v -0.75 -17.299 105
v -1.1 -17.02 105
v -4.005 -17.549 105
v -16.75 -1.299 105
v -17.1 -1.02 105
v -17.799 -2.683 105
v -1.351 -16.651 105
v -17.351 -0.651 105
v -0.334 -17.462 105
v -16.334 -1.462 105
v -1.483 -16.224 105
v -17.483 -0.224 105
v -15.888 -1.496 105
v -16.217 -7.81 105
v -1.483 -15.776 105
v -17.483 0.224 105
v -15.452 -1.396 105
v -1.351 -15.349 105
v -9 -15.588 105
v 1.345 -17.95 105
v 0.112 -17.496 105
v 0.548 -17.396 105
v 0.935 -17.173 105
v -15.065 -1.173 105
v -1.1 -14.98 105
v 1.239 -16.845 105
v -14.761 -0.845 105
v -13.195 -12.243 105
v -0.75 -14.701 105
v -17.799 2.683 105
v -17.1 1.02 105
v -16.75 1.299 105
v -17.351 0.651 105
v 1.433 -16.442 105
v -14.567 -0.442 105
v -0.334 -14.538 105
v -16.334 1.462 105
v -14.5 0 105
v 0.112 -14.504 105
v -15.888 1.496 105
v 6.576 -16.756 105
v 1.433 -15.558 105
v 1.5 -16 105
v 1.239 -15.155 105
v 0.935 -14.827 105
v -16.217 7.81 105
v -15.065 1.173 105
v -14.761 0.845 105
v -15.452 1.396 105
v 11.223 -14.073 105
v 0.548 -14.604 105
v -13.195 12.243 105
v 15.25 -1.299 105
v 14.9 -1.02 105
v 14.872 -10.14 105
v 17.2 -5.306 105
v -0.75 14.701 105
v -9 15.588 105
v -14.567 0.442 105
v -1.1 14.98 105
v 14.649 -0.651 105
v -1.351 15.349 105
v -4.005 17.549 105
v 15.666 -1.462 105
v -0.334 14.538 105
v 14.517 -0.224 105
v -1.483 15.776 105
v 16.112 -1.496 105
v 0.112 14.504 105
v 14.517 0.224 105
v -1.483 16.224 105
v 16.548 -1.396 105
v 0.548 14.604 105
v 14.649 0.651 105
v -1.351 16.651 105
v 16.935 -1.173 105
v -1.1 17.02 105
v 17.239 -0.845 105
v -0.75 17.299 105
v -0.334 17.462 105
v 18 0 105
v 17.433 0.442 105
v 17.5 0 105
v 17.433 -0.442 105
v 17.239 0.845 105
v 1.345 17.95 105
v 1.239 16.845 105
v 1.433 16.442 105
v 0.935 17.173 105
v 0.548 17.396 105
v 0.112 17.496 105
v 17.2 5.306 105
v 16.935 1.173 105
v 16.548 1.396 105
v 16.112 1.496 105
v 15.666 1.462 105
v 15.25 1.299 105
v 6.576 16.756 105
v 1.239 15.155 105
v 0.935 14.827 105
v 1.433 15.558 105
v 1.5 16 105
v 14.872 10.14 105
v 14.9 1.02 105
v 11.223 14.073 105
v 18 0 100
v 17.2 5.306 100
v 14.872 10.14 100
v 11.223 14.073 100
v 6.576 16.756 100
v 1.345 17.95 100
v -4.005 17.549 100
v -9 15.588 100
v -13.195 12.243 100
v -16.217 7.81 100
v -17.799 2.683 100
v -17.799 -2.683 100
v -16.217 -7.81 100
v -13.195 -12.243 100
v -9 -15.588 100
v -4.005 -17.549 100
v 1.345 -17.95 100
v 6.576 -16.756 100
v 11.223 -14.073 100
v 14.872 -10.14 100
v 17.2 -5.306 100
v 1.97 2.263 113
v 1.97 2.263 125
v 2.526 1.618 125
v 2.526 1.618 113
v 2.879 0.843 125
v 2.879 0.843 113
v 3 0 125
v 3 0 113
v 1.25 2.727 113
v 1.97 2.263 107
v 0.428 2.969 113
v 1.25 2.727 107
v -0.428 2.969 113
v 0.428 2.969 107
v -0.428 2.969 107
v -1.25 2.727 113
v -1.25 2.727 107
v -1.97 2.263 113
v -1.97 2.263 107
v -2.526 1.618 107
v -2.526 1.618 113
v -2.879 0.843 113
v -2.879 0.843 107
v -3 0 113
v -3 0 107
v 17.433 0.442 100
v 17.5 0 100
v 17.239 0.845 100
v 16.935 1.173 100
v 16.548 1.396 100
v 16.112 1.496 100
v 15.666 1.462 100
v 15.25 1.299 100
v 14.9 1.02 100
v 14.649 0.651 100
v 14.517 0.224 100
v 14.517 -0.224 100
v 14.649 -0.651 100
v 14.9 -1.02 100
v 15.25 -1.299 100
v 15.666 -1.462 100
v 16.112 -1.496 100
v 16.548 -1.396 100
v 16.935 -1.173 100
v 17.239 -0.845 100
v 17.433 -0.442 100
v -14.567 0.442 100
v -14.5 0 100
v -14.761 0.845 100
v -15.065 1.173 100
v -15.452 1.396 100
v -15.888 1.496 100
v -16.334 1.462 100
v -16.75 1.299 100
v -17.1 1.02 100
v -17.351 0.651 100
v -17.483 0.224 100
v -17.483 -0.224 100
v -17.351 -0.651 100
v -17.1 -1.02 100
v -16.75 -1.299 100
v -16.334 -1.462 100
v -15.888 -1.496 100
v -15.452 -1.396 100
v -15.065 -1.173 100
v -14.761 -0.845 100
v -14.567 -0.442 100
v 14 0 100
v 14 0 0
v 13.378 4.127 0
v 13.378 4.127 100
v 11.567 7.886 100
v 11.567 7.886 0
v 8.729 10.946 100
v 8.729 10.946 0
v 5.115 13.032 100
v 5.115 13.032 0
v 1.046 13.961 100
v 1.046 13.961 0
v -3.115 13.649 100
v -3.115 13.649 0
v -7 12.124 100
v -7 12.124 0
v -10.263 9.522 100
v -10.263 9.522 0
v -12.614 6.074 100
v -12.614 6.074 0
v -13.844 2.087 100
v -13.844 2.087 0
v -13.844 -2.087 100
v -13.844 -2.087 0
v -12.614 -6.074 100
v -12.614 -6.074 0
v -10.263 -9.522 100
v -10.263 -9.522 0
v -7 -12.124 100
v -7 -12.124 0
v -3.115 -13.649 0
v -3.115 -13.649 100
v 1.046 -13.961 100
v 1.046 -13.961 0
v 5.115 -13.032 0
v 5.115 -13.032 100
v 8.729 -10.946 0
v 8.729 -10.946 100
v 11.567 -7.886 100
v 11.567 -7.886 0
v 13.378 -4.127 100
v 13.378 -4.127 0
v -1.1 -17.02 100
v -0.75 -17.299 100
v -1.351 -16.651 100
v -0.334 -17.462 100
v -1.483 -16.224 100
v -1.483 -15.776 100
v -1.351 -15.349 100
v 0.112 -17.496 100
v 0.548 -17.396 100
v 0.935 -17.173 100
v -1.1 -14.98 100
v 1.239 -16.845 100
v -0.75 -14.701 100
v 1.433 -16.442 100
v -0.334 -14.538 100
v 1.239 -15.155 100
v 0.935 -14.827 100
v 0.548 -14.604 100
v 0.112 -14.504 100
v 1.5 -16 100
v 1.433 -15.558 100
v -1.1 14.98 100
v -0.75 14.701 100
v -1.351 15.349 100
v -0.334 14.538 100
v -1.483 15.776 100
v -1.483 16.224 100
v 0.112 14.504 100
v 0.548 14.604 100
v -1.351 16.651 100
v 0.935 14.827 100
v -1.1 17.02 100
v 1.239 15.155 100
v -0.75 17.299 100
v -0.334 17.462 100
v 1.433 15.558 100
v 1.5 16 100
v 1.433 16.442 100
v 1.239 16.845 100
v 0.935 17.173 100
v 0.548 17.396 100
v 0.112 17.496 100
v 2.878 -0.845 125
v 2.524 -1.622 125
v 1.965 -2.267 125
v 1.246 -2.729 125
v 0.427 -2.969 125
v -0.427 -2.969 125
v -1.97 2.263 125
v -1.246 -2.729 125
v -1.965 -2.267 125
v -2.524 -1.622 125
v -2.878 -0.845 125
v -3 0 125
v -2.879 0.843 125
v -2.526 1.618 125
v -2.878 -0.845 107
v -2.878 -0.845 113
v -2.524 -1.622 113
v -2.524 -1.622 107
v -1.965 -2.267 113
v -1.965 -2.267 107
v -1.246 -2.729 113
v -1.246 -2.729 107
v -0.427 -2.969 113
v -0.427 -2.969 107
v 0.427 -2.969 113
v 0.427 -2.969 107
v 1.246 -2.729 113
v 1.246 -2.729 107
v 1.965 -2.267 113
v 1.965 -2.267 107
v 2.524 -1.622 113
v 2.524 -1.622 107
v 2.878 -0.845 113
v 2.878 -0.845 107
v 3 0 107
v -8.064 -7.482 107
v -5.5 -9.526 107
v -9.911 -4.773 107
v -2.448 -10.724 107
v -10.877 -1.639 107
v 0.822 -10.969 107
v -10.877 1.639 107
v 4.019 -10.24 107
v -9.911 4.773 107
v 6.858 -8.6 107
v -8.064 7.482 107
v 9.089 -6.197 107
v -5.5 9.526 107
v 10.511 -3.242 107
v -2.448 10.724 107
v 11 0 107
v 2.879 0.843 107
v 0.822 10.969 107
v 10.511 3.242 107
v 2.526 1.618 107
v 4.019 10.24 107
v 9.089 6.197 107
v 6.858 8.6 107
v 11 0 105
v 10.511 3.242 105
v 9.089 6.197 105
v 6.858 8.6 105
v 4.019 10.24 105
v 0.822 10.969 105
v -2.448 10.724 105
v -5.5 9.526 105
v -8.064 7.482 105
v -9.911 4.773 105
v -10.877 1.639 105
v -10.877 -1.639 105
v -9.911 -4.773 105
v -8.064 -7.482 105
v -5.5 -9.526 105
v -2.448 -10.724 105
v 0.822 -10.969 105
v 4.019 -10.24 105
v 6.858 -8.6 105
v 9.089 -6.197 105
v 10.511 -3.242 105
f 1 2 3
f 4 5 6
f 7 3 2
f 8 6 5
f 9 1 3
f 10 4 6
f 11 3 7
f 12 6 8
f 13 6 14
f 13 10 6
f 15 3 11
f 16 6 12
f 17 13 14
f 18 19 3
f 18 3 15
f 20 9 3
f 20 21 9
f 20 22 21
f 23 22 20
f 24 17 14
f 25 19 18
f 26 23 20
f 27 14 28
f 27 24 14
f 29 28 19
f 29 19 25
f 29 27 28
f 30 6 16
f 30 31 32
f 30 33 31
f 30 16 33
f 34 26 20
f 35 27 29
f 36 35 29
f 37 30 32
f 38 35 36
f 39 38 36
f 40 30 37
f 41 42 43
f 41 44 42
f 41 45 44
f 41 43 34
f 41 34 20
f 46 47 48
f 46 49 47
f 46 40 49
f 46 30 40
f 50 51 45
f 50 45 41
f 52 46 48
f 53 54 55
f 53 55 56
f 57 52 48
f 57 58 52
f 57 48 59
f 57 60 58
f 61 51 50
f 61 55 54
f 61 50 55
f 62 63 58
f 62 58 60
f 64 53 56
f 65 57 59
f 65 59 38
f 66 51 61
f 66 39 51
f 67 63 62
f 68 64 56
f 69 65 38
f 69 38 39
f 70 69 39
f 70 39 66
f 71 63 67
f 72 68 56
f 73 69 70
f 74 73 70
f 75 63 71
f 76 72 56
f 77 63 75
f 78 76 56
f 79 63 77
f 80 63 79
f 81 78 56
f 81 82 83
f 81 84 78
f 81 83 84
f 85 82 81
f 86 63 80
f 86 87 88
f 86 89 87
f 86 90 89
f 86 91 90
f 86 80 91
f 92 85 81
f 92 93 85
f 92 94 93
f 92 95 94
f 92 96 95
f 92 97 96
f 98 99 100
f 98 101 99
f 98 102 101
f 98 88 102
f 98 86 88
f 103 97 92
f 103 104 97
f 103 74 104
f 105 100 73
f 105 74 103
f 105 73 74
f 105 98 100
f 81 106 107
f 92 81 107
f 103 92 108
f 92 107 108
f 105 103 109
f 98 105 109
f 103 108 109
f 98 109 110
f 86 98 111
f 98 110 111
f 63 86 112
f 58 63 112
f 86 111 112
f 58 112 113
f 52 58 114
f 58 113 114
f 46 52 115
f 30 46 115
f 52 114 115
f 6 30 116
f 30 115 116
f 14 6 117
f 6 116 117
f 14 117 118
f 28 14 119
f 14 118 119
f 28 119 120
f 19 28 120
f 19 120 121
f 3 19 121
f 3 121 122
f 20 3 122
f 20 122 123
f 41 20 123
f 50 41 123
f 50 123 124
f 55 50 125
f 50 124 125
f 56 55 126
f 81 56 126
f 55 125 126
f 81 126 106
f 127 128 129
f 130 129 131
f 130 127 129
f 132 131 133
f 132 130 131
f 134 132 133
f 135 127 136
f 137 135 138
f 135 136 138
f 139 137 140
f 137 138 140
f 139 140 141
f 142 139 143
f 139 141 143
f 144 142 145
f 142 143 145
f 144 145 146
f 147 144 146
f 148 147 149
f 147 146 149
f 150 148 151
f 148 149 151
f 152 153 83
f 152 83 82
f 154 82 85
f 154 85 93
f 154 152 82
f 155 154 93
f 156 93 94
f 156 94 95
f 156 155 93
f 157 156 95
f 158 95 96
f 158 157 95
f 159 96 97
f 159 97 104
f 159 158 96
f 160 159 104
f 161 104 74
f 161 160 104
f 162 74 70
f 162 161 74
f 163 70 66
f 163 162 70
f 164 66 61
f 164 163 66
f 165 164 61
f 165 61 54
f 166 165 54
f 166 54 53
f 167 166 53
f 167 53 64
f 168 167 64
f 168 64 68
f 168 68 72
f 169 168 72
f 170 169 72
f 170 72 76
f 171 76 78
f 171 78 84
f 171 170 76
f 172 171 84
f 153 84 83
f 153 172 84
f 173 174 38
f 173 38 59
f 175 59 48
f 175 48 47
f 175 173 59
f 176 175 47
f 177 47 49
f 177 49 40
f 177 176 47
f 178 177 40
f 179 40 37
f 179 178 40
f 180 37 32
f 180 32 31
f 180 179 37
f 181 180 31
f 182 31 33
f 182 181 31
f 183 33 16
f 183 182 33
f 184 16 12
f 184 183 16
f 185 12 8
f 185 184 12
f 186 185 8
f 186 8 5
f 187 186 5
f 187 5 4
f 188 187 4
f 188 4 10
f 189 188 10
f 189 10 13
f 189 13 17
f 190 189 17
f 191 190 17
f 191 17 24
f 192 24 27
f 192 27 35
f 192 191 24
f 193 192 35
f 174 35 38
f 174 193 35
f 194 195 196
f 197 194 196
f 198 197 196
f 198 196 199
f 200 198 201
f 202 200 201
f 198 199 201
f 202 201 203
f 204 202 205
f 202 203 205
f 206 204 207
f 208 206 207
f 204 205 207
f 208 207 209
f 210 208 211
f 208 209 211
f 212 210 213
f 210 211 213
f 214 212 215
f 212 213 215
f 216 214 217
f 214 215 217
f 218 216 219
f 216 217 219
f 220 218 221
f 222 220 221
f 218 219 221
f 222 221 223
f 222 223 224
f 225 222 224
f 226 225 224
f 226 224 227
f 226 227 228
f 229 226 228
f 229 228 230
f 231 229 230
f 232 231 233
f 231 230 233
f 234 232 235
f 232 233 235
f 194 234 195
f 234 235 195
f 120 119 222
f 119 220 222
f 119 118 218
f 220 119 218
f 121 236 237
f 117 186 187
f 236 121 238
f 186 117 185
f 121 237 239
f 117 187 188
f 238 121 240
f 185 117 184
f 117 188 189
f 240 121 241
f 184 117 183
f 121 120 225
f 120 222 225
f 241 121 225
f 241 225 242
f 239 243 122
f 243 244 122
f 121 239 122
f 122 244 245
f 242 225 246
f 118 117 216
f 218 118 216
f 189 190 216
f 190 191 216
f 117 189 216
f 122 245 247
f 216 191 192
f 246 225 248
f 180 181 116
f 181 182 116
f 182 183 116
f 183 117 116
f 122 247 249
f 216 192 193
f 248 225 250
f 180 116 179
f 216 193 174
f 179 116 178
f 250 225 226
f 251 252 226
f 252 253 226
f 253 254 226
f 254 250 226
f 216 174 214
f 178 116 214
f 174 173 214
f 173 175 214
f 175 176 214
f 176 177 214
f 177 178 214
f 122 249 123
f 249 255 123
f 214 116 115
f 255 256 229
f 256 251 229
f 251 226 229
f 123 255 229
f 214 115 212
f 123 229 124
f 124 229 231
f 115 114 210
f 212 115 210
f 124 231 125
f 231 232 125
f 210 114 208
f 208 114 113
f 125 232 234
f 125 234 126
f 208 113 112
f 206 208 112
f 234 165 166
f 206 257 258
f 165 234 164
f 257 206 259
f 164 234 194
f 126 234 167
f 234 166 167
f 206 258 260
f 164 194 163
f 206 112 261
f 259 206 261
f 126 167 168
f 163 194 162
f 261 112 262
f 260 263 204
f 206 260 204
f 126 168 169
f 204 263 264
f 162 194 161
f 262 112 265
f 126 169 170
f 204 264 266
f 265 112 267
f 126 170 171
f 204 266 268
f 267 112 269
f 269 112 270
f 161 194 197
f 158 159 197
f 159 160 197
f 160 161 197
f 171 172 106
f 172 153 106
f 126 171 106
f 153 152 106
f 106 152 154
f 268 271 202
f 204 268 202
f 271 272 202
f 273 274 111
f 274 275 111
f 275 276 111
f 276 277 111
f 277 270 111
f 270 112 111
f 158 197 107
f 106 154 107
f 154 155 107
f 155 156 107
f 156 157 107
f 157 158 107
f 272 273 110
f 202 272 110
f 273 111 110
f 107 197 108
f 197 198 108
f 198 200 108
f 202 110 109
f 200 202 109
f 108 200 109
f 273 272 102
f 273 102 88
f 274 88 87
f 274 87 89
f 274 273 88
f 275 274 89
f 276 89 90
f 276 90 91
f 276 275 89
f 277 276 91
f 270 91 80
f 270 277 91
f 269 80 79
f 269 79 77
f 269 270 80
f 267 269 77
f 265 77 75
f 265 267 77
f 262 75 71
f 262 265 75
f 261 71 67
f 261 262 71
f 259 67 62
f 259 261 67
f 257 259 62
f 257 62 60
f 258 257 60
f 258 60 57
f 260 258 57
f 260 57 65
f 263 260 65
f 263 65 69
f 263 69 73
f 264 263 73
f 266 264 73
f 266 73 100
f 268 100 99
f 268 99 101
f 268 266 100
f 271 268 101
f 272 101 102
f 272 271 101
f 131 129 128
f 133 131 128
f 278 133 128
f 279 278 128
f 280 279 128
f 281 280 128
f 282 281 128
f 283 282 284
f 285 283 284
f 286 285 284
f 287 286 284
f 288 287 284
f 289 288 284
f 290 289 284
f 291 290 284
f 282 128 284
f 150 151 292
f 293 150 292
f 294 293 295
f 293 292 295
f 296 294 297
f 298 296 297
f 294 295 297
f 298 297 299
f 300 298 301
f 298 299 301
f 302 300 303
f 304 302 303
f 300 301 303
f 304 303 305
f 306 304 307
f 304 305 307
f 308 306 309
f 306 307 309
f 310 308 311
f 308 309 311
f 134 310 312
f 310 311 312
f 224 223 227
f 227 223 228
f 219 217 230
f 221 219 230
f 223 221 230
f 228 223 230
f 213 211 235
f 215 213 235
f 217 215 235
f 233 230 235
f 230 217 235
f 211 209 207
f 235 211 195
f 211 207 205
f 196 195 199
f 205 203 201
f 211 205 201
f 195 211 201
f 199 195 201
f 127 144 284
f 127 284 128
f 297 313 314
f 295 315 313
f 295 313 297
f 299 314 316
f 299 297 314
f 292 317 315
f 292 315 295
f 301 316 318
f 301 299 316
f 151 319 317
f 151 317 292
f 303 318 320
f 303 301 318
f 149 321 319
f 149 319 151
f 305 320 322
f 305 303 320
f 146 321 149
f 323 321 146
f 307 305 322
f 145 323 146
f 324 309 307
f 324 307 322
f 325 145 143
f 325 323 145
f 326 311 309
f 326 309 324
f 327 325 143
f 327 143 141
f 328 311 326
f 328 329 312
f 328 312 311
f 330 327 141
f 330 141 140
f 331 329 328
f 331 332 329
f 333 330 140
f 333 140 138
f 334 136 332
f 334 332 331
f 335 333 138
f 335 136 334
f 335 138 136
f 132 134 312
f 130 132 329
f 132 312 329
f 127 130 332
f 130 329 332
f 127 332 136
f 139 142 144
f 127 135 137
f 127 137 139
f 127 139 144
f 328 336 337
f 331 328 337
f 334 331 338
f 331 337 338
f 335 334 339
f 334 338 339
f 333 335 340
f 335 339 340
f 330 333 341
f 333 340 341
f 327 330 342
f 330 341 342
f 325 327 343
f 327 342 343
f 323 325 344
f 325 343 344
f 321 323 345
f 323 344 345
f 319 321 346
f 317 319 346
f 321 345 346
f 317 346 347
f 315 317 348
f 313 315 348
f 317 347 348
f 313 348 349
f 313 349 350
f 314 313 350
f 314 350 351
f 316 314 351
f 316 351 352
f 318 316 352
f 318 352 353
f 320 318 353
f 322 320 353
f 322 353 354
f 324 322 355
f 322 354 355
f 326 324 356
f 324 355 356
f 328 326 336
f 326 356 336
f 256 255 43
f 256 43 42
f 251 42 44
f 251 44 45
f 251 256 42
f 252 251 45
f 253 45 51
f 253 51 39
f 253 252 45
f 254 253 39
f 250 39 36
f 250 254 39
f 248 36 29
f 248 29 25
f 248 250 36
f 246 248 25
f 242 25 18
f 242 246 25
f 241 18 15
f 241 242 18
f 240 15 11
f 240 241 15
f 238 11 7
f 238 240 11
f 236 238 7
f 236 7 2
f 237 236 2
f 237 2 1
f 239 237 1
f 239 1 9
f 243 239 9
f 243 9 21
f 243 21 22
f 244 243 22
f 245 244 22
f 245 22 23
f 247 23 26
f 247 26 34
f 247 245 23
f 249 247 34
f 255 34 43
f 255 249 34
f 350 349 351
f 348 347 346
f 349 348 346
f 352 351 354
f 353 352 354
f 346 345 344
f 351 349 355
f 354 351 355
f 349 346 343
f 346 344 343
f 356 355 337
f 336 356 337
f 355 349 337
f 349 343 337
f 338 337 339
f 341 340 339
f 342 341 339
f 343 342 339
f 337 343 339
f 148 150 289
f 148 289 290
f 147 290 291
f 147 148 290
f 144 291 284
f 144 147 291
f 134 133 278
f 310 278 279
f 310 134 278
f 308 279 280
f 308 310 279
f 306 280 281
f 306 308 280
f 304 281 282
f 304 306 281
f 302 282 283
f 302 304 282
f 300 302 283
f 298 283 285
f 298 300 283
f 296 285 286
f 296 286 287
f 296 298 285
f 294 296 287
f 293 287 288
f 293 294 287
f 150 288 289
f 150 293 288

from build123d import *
from build123d.topology import SkipClean

# Parameters (mm, degrees)
SKETCH1_R           = 14
BOSS_EXTRUDE1_DEPTH = 100
SKETCH3_R           = 18
SKETCH3_R_2         = 1.5
BOSS_EXTRUDE2_DEPTH = 5
SKETCH4_R           = 11
BOSS_EXTRUDE3_DEPTH = 2
SKETCH5_R           = 3
BOSS_EXTRUDE4_DEPTH = 6
BOSS_EXTRUDE5_DEPTH = 18


with BuildPart() as part:
    # Sketch1 → Boss-Extrude1 (new body)
    with BuildSketch(Plane.XY):
        Circle(SKETCH1_R)
    extrude(amount=BOSS_EXTRUDE1_DEPTH)

    # Sketch3 → Boss-Extrude2 (add)
    with BuildSketch(Plane.XY.offset(100)):
        Circle(SKETCH3_R)
        with Locations((16, 0)):
            Circle(SKETCH3_R_2, mode=Mode.SUBTRACT)
        with Locations((0, 16)):
            Circle(SKETCH3_R_2, mode=Mode.SUBTRACT)
        with Locations((-16, 0)):
            Circle(SKETCH3_R_2, mode=Mode.SUBTRACT)
        with Locations((0, -16)):
            Circle(SKETCH3_R_2, mode=Mode.SUBTRACT)
    extrude(amount=BOSS_EXTRUDE2_DEPTH)


with BuildPart() as body_2:
    # Sketch4 → Boss-Extrude3 (new body)
    with BuildSketch(Plane.XY.offset(105)):
        Circle(SKETCH4_R)
    extrude(amount=BOSS_EXTRUDE3_DEPTH)

    # Sketch5 → Boss-Extrude4 (add)
    with BuildSketch(Plane.XY.offset(107)):
        Circle(SKETCH5_R)
    extrude(amount=BOSS_EXTRUDE4_DEPTH)

    # Sketch7 → Boss-Extrude5 (add)
    with SkipClean():  # the faces are left unmerged after this step: merging them gives an invalid solid
        with BuildSketch(Plane.XY.offset(107)):
            with BuildLine():
                Line((-1.969853899, 2.262670019), (1.969853899, 2.262670019))
                ThreePointArc((1.969853899, 2.262670019), (2.730344456, 1.243068442), (3, 0))
                ThreePointArc((3, 0), (0, -3), (-3, 0))
                ThreePointArc((-3, 0), (-2.730344456, 1.243068442), (-1.969853899, 2.262670019))
            make_face()
        extrude(amount=BOSS_EXTRUDE5_DEPTH)


solid = Compound([part.part, body_2.part])
